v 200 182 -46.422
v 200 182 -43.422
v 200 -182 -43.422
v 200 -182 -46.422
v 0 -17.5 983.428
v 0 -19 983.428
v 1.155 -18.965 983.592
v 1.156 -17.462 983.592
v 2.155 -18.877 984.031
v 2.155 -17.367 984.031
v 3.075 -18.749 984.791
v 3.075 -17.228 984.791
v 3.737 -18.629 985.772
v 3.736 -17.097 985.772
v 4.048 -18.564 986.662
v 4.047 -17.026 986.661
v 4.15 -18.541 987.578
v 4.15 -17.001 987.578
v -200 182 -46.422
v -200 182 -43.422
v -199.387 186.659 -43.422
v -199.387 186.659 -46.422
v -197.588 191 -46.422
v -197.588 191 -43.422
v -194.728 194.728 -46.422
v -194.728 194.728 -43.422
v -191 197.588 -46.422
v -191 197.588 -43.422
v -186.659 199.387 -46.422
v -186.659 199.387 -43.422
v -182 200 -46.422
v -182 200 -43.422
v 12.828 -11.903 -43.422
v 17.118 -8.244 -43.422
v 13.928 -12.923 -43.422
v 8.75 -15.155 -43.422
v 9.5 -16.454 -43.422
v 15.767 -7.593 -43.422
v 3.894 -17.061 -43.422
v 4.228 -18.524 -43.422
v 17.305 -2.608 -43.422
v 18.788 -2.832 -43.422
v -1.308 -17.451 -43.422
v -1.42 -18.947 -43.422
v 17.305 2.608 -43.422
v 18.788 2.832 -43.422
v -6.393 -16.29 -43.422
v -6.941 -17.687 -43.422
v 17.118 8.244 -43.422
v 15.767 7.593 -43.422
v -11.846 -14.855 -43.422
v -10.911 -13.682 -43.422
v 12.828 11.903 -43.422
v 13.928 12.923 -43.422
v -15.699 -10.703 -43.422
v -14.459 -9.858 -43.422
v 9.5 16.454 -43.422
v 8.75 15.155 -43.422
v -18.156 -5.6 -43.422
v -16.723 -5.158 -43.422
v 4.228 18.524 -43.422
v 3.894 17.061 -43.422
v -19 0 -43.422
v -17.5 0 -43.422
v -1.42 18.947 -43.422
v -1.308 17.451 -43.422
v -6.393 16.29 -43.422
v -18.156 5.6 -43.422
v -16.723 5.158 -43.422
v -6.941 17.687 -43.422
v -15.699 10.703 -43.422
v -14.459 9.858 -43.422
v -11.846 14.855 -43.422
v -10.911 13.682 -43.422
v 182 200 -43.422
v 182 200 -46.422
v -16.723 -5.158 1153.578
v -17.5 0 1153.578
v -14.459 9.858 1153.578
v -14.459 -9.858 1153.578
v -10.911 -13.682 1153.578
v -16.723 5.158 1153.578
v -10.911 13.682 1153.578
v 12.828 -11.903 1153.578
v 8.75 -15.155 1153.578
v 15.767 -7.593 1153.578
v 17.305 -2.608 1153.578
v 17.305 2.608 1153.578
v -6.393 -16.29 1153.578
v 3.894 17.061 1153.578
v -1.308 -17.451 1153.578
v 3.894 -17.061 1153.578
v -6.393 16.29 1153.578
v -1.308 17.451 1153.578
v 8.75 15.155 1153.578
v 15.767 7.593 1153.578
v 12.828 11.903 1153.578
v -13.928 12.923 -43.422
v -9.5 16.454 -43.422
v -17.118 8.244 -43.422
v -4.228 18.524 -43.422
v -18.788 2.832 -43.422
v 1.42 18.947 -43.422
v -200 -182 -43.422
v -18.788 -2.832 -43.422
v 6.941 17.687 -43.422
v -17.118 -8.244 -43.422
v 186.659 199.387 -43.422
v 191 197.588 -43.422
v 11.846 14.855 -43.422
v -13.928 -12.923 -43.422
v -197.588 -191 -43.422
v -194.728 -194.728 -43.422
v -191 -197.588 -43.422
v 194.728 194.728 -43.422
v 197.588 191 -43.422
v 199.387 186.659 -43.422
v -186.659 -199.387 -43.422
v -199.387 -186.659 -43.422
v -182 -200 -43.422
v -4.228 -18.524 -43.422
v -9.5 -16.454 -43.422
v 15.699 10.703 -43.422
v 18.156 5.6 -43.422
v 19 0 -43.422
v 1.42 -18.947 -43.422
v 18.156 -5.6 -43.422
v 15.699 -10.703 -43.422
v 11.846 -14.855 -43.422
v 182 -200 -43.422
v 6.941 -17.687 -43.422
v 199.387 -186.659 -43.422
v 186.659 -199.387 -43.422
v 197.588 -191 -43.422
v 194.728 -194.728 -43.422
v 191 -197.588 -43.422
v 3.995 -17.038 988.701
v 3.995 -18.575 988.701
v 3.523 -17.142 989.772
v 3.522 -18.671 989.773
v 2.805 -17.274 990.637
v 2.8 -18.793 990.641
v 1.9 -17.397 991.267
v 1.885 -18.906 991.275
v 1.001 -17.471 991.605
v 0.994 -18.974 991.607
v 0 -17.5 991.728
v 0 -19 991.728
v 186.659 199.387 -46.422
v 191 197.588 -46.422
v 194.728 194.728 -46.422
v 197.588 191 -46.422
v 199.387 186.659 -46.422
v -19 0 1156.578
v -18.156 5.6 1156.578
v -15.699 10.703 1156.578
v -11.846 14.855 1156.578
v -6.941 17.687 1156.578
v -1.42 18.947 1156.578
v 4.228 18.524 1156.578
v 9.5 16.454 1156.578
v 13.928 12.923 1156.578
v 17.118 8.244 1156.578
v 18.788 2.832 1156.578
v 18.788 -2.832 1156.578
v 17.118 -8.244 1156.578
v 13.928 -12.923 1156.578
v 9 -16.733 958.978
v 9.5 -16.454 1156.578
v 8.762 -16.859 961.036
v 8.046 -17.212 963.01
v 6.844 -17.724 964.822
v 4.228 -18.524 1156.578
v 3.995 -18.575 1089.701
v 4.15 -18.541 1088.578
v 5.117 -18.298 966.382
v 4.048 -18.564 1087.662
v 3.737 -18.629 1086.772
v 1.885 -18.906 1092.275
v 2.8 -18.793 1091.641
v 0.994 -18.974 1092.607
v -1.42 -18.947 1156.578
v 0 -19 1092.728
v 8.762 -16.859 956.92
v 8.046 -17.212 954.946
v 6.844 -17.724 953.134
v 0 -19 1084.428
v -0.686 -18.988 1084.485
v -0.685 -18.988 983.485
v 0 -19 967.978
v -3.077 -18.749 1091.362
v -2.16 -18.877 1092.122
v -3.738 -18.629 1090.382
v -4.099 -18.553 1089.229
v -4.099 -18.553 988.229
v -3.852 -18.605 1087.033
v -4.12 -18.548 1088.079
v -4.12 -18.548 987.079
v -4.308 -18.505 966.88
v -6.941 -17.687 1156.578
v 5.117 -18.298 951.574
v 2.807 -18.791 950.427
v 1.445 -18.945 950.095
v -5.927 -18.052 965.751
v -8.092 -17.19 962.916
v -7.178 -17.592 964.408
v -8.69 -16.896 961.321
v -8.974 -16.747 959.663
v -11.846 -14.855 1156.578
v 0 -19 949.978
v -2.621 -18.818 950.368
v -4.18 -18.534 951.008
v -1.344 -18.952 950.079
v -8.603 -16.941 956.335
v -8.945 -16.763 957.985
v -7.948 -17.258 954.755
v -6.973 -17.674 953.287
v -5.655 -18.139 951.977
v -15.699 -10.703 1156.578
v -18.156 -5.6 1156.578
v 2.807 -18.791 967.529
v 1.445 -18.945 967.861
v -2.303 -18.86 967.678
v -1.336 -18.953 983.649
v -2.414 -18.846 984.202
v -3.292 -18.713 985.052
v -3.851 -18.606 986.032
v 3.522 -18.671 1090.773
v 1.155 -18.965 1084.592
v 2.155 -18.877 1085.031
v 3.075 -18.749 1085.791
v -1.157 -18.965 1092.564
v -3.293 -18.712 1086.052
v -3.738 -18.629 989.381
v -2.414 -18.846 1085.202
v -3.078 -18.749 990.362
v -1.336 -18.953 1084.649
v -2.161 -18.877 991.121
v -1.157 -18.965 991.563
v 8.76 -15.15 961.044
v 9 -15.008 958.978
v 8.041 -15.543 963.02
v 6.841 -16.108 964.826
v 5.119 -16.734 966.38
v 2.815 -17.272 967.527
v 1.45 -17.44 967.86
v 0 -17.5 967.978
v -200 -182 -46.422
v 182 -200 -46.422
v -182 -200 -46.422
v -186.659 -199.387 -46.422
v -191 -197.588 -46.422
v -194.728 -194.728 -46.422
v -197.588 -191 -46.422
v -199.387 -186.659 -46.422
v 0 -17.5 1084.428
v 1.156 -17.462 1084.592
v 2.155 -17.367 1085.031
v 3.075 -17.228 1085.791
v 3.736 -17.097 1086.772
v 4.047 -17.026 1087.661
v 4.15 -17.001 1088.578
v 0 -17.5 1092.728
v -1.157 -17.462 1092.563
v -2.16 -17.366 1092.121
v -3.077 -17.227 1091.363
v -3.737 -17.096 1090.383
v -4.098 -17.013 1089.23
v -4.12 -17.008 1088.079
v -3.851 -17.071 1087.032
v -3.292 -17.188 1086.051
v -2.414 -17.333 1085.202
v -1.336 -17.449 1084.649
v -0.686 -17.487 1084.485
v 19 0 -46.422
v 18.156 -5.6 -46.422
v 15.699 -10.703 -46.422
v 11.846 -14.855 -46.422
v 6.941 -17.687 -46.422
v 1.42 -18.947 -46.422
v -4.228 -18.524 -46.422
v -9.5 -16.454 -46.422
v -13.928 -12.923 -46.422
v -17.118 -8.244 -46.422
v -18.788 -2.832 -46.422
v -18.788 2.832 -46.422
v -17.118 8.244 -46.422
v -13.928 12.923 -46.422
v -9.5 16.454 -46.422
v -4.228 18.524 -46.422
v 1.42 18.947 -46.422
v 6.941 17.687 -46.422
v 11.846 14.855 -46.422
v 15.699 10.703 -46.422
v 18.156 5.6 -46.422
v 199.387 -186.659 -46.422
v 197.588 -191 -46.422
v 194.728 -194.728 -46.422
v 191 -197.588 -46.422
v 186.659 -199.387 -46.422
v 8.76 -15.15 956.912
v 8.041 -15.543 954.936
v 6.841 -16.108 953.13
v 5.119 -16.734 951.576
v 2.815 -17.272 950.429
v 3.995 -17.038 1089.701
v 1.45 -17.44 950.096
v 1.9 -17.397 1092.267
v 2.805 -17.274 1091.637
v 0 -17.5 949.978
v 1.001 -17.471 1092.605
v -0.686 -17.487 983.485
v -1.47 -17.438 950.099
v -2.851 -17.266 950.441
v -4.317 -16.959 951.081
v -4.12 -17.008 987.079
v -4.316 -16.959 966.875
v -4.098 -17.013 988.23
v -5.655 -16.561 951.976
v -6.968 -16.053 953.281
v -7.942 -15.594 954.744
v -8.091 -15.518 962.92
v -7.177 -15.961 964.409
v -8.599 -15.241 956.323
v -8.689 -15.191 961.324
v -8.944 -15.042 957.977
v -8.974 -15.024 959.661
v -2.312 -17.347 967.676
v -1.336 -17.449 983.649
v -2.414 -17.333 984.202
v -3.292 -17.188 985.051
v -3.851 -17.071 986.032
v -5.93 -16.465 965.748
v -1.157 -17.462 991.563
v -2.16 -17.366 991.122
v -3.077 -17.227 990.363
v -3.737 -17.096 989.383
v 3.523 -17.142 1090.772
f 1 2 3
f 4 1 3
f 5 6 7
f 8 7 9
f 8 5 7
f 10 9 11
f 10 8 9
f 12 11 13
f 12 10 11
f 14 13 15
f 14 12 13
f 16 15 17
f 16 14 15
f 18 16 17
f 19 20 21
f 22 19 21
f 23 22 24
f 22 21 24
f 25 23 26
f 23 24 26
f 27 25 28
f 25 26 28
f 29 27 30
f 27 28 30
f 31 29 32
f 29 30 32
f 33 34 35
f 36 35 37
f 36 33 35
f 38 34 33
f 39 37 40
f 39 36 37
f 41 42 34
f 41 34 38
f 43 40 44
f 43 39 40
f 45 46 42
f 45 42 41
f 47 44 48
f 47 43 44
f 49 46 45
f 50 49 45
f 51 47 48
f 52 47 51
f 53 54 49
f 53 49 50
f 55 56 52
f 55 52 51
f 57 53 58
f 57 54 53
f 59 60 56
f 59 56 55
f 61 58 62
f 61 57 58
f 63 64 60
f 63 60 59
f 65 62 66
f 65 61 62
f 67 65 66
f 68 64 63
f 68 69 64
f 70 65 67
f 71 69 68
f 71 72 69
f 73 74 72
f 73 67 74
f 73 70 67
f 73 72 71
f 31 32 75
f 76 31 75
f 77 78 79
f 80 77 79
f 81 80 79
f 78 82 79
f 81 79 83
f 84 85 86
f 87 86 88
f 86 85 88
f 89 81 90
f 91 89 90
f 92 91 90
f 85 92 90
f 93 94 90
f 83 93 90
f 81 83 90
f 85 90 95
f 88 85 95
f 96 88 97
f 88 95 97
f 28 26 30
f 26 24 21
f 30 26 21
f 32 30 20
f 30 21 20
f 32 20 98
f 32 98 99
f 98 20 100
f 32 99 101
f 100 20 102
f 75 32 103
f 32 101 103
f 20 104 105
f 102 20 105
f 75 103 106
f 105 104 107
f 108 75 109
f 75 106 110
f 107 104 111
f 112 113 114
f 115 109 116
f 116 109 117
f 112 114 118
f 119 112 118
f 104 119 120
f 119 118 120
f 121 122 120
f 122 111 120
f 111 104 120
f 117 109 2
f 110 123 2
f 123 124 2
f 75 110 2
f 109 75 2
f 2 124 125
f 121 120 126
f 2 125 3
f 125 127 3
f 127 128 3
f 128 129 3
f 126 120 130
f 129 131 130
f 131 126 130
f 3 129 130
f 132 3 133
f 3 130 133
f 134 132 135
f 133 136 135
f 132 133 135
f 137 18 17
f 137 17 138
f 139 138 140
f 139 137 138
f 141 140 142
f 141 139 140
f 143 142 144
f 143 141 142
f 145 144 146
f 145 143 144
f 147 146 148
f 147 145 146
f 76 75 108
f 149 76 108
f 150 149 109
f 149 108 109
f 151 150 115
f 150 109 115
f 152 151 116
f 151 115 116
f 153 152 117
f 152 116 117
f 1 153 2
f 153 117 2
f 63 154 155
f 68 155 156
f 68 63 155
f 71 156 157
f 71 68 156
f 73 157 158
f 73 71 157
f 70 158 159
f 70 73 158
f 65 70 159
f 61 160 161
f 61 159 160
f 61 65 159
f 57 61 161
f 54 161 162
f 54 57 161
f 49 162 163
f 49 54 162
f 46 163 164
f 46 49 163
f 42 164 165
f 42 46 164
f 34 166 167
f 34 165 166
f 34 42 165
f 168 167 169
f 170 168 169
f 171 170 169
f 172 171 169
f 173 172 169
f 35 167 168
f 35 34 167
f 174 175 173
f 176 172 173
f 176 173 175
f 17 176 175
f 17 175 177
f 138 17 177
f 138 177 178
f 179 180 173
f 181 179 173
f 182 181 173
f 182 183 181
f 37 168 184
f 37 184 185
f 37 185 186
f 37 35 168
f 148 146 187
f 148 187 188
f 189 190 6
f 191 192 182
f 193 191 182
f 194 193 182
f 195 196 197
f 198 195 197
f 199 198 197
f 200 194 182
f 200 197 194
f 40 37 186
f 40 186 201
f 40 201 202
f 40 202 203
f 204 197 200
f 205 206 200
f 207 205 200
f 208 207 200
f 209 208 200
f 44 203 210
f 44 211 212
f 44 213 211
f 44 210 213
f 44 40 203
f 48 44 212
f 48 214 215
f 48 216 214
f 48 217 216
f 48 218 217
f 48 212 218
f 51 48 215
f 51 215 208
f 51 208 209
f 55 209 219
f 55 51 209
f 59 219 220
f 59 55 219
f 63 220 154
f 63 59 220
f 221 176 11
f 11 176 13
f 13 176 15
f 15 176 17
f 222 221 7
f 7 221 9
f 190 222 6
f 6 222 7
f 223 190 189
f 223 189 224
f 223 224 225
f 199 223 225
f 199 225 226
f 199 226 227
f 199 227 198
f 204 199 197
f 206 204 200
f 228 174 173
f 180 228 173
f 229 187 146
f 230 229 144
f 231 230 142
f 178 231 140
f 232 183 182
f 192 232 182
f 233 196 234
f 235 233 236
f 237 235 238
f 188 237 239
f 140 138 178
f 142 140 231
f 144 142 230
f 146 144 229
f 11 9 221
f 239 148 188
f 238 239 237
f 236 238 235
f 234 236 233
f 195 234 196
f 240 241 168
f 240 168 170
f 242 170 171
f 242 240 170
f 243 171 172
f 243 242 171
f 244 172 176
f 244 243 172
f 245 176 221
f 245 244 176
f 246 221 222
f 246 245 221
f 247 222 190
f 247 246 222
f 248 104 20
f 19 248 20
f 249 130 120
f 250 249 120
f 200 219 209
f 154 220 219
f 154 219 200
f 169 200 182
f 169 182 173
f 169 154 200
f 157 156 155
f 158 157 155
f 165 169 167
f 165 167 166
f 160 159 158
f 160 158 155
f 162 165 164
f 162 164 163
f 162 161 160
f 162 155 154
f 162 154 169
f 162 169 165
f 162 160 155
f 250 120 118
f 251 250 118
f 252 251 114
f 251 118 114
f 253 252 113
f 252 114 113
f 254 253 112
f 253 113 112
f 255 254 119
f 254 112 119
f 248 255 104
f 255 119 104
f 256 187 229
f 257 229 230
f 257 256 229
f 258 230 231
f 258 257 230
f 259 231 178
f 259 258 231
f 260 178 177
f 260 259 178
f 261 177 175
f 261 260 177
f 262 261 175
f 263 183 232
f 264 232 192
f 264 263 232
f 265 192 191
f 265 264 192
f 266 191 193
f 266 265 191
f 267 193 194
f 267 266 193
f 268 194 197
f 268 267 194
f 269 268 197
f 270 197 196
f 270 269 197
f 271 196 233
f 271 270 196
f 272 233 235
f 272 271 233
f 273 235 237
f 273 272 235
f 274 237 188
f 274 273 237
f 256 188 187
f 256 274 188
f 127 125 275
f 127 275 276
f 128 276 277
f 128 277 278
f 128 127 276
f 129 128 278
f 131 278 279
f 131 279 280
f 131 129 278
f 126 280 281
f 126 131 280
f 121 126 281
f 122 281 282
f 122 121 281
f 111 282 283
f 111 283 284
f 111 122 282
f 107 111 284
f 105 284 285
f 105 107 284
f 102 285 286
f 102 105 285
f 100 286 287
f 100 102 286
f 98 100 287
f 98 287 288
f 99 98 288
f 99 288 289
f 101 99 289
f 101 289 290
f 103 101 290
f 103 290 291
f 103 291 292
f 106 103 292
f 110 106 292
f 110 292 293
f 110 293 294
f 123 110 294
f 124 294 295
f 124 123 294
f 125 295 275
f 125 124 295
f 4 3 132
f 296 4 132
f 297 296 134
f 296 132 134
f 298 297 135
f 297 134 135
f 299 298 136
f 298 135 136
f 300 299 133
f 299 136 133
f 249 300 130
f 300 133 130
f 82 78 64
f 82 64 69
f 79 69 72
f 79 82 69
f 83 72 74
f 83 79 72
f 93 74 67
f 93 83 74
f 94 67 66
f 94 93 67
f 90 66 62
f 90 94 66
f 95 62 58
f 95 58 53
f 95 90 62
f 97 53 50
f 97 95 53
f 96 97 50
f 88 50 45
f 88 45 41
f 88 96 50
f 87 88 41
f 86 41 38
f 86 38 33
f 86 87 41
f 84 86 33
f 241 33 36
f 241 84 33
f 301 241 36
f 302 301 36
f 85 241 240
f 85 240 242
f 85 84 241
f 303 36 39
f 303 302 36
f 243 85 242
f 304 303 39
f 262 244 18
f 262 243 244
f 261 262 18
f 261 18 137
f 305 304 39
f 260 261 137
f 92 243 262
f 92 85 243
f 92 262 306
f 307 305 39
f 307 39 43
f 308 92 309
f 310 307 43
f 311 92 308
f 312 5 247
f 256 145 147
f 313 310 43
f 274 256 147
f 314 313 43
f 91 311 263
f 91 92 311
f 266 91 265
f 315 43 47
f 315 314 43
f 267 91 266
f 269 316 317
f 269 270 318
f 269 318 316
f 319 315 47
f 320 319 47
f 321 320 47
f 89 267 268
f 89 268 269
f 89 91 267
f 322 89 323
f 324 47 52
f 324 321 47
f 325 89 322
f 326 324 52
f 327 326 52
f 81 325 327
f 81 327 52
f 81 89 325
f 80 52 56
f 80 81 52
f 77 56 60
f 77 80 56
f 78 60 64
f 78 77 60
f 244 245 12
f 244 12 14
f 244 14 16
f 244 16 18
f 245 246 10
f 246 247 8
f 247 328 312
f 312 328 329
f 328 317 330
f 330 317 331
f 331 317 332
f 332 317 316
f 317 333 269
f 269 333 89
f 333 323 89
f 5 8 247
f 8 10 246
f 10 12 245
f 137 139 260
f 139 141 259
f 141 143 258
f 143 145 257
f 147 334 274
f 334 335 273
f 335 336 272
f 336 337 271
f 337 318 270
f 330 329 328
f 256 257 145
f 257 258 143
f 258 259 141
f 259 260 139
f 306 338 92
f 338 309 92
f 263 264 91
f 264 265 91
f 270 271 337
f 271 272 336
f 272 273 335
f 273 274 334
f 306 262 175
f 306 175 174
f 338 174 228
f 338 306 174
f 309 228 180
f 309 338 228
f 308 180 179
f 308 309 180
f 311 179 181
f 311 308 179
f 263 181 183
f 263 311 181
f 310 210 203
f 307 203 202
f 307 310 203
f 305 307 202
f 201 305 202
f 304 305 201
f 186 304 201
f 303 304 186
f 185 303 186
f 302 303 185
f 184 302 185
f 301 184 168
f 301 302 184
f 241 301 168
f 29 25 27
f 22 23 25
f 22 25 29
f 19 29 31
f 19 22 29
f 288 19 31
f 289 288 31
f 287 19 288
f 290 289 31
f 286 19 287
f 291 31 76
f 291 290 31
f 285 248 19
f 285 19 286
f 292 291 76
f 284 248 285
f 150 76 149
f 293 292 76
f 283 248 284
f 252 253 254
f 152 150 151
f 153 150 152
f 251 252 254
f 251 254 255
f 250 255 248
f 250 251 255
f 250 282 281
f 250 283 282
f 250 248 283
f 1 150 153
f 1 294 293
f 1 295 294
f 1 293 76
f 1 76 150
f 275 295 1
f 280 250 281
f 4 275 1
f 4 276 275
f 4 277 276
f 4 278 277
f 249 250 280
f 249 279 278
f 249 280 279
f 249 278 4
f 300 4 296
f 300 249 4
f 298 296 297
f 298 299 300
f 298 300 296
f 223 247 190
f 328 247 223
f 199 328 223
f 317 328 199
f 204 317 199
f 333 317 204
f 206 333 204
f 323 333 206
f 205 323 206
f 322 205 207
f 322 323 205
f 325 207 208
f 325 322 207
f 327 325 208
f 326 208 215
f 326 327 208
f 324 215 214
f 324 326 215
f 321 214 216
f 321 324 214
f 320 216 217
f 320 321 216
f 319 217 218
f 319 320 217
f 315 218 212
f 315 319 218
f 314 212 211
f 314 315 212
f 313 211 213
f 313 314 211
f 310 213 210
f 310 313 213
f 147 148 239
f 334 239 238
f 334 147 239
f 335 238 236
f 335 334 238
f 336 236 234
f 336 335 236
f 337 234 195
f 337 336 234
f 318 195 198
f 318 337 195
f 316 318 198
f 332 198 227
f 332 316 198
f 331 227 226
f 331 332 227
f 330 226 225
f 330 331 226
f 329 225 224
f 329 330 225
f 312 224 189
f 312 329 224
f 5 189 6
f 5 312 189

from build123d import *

# Parameters (mm, degrees)
F2_DEPTH = 19.001
F3_DEPTH = 19.0010001
F4_DEPTH = 19.0010001
F5_R     = 19
F6_DEPTH = 3
F7_R     = 19
F8_DEPTH = 3


with BuildPart() as f1:
    # F0 (on Front) → F1 (revolve)
    with BuildSketch(Plane.XZ):
        Polygon((-17.5, -43.4220433303), (-17.5, 1156.5779566697), (-19, 1156.5779566697), (-19, -41.8273694813), (-19, -43.4220433303), align=None)
    revolve(axis=Axis((0, 0, 1124.6529566697), (0, 0, -1)))

    # F0 (on Front) → F2 (cut, through all)
    with BuildSketch(Plane.XZ):
        with BuildLine():
            ThreePointArc((4.15, 987.5779566697), (2.9344931419, 990.5124498116), (0, 991.7279566697))
            ThreePointArc((0, 991.7279566697), (-4.15, 987.5779566697), (0, 983.4279566697))
            ThreePointArc((0, 983.4279566697), (2.9344931419, 984.6434635278), (4.15, 987.5779566697))
        make_face()
        with BuildLine():
            ThreePointArc((0, 967.9779566697), (-9, 958.9779566697), (0, 949.9779566697))
            ThreePointArc((0, 949.9779566697), (6.3639610307, 952.613995639), (9, 958.9779566697))
            ThreePointArc((9, 958.9779566697), (6.3639610307, 965.3419177004), (0, 967.9779566697))
        make_face()
    extrude(amount=F2_DEPTH, mode=Mode.SUBTRACT)

    # F0 (on Front) → F3 (cut, through all)
    with BuildSketch(Plane.XZ):
        with BuildLine():
            ThreePointArc((4.15, 1088.5779566697), (2.9344931419, 1091.5124498116), (0, 1092.7279566697))
            ThreePointArc((0, 1092.7279566697), (-4.15, 1088.5779566697), (0, 1084.4279566697))
            ThreePointArc((0, 1084.4279566697), (2.9344931419, 1085.6434635278), (4.15, 1088.5779566697))
        make_face()
    extrude(amount=F3_DEPTH, mode=Mode.SUBTRACT)

    # F0 (on Front) → F4 (cut, through all)
    with BuildSketch(Plane.XZ):
        with BuildLine():
            ThreePointArc((0, 967.9779566697), (-9, 958.9779566697), (0, 949.9779566697))
            ThreePointArc((0, 949.9779566697), (6.3639610307, 952.613995639), (9, 958.9779566697))
            ThreePointArc((9, 958.9779566697), (6.3639610307, 965.3419177004), (0, 967.9779566697))
        make_face()
    extrude(amount=F4_DEPTH, mode=Mode.SUBTRACT)

    # F7 (on face) → F8 (join)
    with BuildSketch(Plane.XY.offset(1156.5779566697)):
        Circle(F7_R)
    extrude(amount=-F8_DEPTH)


with BuildPart() as f6:
    # F5 (on face) → F6 (new body)
    with BuildSketch(Plane(origin=(0, 0, -43.4220433303), x_dir=(1, 0, 0), z_dir=(0, 0, -1))):
        with BuildLine():
            Line((182, 200), (-182, 200))
            ThreePointArc((-182, 200), (-194.7279220614, 194.7279220614), (-200, 182))
            Line((-200, 182), (-200, -182))
            ThreePointArc((-200, -182), (-194.7279220614, -194.7279220614), (-182, -200))
            Line((-182, -200), (182, -200))
            ThreePointArc((182, -200), (194.7279220614, -194.7279220614), (200, -182))
            Line((200, -182), (200, 182))
            ThreePointArc((200, 182), (194.7279220614, 194.7279220614), (182, 200))
        make_face()
        Circle(F5_R, mode=Mode.SUBTRACT)
    extrude(amount=F6_DEPTH)


solid = Compound([f1.part, f6.part])
